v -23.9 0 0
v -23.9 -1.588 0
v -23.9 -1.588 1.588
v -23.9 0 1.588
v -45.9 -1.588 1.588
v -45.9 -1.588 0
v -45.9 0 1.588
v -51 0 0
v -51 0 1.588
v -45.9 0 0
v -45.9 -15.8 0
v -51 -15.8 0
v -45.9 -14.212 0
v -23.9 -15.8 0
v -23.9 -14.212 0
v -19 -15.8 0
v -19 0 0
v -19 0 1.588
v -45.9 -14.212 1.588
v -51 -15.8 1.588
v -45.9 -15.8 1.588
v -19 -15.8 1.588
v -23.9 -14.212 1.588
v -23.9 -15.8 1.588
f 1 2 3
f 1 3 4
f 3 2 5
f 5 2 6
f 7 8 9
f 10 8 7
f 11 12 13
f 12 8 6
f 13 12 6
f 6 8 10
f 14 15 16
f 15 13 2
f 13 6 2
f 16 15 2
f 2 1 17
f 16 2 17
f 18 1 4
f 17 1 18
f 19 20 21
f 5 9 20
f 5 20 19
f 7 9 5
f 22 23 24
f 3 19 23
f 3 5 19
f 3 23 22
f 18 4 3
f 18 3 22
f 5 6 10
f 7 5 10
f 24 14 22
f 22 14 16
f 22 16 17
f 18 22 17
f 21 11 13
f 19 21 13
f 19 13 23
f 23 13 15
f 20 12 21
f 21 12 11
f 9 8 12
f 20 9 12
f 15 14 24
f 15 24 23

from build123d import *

# Parameters (mm, degrees)
SKETCH2_W           = 5.1
SKETCH2_H           = 1.5875
SKETCH2_W_2         = 4.9
BOSS_EXTRUDE1_DEPTH = 1.5875


with BuildPart() as part:
    # Sketch2 → Boss-Extrude1 (new body)
    with BuildSketch(Plane.XY):
        Polygon((-19, -7.9), (-51, -7.9), (-51, -14.2125), (-45.9, -14.2125), (-23.9, -14.2125), (-19, -14.2125), align=None)
        with Locations((-48.45, -15.00625)):
            Rectangle(SKETCH2_W, SKETCH2_H)
        Polygon((-23.9, -1.5875), (-45.9, -1.5875), (-51, -1.5875), (-51, -7.9), (-19, -7.9), (-19, -1.5875), align=None)
        with Locations((-48.45, -0.79375)):
            Rectangle(SKETCH2_W, SKETCH2_H)
        with Locations((-21.45, -0.79375)):
            Rectangle(SKETCH2_W_2, SKETCH2_H)
        with Locations((-21.45, -15.00625)):
            Rectangle(SKETCH2_W_2, SKETCH2_H)
    extrude(amount=BOSS_EXTRUDE1_DEPTH)


solid = part.part
